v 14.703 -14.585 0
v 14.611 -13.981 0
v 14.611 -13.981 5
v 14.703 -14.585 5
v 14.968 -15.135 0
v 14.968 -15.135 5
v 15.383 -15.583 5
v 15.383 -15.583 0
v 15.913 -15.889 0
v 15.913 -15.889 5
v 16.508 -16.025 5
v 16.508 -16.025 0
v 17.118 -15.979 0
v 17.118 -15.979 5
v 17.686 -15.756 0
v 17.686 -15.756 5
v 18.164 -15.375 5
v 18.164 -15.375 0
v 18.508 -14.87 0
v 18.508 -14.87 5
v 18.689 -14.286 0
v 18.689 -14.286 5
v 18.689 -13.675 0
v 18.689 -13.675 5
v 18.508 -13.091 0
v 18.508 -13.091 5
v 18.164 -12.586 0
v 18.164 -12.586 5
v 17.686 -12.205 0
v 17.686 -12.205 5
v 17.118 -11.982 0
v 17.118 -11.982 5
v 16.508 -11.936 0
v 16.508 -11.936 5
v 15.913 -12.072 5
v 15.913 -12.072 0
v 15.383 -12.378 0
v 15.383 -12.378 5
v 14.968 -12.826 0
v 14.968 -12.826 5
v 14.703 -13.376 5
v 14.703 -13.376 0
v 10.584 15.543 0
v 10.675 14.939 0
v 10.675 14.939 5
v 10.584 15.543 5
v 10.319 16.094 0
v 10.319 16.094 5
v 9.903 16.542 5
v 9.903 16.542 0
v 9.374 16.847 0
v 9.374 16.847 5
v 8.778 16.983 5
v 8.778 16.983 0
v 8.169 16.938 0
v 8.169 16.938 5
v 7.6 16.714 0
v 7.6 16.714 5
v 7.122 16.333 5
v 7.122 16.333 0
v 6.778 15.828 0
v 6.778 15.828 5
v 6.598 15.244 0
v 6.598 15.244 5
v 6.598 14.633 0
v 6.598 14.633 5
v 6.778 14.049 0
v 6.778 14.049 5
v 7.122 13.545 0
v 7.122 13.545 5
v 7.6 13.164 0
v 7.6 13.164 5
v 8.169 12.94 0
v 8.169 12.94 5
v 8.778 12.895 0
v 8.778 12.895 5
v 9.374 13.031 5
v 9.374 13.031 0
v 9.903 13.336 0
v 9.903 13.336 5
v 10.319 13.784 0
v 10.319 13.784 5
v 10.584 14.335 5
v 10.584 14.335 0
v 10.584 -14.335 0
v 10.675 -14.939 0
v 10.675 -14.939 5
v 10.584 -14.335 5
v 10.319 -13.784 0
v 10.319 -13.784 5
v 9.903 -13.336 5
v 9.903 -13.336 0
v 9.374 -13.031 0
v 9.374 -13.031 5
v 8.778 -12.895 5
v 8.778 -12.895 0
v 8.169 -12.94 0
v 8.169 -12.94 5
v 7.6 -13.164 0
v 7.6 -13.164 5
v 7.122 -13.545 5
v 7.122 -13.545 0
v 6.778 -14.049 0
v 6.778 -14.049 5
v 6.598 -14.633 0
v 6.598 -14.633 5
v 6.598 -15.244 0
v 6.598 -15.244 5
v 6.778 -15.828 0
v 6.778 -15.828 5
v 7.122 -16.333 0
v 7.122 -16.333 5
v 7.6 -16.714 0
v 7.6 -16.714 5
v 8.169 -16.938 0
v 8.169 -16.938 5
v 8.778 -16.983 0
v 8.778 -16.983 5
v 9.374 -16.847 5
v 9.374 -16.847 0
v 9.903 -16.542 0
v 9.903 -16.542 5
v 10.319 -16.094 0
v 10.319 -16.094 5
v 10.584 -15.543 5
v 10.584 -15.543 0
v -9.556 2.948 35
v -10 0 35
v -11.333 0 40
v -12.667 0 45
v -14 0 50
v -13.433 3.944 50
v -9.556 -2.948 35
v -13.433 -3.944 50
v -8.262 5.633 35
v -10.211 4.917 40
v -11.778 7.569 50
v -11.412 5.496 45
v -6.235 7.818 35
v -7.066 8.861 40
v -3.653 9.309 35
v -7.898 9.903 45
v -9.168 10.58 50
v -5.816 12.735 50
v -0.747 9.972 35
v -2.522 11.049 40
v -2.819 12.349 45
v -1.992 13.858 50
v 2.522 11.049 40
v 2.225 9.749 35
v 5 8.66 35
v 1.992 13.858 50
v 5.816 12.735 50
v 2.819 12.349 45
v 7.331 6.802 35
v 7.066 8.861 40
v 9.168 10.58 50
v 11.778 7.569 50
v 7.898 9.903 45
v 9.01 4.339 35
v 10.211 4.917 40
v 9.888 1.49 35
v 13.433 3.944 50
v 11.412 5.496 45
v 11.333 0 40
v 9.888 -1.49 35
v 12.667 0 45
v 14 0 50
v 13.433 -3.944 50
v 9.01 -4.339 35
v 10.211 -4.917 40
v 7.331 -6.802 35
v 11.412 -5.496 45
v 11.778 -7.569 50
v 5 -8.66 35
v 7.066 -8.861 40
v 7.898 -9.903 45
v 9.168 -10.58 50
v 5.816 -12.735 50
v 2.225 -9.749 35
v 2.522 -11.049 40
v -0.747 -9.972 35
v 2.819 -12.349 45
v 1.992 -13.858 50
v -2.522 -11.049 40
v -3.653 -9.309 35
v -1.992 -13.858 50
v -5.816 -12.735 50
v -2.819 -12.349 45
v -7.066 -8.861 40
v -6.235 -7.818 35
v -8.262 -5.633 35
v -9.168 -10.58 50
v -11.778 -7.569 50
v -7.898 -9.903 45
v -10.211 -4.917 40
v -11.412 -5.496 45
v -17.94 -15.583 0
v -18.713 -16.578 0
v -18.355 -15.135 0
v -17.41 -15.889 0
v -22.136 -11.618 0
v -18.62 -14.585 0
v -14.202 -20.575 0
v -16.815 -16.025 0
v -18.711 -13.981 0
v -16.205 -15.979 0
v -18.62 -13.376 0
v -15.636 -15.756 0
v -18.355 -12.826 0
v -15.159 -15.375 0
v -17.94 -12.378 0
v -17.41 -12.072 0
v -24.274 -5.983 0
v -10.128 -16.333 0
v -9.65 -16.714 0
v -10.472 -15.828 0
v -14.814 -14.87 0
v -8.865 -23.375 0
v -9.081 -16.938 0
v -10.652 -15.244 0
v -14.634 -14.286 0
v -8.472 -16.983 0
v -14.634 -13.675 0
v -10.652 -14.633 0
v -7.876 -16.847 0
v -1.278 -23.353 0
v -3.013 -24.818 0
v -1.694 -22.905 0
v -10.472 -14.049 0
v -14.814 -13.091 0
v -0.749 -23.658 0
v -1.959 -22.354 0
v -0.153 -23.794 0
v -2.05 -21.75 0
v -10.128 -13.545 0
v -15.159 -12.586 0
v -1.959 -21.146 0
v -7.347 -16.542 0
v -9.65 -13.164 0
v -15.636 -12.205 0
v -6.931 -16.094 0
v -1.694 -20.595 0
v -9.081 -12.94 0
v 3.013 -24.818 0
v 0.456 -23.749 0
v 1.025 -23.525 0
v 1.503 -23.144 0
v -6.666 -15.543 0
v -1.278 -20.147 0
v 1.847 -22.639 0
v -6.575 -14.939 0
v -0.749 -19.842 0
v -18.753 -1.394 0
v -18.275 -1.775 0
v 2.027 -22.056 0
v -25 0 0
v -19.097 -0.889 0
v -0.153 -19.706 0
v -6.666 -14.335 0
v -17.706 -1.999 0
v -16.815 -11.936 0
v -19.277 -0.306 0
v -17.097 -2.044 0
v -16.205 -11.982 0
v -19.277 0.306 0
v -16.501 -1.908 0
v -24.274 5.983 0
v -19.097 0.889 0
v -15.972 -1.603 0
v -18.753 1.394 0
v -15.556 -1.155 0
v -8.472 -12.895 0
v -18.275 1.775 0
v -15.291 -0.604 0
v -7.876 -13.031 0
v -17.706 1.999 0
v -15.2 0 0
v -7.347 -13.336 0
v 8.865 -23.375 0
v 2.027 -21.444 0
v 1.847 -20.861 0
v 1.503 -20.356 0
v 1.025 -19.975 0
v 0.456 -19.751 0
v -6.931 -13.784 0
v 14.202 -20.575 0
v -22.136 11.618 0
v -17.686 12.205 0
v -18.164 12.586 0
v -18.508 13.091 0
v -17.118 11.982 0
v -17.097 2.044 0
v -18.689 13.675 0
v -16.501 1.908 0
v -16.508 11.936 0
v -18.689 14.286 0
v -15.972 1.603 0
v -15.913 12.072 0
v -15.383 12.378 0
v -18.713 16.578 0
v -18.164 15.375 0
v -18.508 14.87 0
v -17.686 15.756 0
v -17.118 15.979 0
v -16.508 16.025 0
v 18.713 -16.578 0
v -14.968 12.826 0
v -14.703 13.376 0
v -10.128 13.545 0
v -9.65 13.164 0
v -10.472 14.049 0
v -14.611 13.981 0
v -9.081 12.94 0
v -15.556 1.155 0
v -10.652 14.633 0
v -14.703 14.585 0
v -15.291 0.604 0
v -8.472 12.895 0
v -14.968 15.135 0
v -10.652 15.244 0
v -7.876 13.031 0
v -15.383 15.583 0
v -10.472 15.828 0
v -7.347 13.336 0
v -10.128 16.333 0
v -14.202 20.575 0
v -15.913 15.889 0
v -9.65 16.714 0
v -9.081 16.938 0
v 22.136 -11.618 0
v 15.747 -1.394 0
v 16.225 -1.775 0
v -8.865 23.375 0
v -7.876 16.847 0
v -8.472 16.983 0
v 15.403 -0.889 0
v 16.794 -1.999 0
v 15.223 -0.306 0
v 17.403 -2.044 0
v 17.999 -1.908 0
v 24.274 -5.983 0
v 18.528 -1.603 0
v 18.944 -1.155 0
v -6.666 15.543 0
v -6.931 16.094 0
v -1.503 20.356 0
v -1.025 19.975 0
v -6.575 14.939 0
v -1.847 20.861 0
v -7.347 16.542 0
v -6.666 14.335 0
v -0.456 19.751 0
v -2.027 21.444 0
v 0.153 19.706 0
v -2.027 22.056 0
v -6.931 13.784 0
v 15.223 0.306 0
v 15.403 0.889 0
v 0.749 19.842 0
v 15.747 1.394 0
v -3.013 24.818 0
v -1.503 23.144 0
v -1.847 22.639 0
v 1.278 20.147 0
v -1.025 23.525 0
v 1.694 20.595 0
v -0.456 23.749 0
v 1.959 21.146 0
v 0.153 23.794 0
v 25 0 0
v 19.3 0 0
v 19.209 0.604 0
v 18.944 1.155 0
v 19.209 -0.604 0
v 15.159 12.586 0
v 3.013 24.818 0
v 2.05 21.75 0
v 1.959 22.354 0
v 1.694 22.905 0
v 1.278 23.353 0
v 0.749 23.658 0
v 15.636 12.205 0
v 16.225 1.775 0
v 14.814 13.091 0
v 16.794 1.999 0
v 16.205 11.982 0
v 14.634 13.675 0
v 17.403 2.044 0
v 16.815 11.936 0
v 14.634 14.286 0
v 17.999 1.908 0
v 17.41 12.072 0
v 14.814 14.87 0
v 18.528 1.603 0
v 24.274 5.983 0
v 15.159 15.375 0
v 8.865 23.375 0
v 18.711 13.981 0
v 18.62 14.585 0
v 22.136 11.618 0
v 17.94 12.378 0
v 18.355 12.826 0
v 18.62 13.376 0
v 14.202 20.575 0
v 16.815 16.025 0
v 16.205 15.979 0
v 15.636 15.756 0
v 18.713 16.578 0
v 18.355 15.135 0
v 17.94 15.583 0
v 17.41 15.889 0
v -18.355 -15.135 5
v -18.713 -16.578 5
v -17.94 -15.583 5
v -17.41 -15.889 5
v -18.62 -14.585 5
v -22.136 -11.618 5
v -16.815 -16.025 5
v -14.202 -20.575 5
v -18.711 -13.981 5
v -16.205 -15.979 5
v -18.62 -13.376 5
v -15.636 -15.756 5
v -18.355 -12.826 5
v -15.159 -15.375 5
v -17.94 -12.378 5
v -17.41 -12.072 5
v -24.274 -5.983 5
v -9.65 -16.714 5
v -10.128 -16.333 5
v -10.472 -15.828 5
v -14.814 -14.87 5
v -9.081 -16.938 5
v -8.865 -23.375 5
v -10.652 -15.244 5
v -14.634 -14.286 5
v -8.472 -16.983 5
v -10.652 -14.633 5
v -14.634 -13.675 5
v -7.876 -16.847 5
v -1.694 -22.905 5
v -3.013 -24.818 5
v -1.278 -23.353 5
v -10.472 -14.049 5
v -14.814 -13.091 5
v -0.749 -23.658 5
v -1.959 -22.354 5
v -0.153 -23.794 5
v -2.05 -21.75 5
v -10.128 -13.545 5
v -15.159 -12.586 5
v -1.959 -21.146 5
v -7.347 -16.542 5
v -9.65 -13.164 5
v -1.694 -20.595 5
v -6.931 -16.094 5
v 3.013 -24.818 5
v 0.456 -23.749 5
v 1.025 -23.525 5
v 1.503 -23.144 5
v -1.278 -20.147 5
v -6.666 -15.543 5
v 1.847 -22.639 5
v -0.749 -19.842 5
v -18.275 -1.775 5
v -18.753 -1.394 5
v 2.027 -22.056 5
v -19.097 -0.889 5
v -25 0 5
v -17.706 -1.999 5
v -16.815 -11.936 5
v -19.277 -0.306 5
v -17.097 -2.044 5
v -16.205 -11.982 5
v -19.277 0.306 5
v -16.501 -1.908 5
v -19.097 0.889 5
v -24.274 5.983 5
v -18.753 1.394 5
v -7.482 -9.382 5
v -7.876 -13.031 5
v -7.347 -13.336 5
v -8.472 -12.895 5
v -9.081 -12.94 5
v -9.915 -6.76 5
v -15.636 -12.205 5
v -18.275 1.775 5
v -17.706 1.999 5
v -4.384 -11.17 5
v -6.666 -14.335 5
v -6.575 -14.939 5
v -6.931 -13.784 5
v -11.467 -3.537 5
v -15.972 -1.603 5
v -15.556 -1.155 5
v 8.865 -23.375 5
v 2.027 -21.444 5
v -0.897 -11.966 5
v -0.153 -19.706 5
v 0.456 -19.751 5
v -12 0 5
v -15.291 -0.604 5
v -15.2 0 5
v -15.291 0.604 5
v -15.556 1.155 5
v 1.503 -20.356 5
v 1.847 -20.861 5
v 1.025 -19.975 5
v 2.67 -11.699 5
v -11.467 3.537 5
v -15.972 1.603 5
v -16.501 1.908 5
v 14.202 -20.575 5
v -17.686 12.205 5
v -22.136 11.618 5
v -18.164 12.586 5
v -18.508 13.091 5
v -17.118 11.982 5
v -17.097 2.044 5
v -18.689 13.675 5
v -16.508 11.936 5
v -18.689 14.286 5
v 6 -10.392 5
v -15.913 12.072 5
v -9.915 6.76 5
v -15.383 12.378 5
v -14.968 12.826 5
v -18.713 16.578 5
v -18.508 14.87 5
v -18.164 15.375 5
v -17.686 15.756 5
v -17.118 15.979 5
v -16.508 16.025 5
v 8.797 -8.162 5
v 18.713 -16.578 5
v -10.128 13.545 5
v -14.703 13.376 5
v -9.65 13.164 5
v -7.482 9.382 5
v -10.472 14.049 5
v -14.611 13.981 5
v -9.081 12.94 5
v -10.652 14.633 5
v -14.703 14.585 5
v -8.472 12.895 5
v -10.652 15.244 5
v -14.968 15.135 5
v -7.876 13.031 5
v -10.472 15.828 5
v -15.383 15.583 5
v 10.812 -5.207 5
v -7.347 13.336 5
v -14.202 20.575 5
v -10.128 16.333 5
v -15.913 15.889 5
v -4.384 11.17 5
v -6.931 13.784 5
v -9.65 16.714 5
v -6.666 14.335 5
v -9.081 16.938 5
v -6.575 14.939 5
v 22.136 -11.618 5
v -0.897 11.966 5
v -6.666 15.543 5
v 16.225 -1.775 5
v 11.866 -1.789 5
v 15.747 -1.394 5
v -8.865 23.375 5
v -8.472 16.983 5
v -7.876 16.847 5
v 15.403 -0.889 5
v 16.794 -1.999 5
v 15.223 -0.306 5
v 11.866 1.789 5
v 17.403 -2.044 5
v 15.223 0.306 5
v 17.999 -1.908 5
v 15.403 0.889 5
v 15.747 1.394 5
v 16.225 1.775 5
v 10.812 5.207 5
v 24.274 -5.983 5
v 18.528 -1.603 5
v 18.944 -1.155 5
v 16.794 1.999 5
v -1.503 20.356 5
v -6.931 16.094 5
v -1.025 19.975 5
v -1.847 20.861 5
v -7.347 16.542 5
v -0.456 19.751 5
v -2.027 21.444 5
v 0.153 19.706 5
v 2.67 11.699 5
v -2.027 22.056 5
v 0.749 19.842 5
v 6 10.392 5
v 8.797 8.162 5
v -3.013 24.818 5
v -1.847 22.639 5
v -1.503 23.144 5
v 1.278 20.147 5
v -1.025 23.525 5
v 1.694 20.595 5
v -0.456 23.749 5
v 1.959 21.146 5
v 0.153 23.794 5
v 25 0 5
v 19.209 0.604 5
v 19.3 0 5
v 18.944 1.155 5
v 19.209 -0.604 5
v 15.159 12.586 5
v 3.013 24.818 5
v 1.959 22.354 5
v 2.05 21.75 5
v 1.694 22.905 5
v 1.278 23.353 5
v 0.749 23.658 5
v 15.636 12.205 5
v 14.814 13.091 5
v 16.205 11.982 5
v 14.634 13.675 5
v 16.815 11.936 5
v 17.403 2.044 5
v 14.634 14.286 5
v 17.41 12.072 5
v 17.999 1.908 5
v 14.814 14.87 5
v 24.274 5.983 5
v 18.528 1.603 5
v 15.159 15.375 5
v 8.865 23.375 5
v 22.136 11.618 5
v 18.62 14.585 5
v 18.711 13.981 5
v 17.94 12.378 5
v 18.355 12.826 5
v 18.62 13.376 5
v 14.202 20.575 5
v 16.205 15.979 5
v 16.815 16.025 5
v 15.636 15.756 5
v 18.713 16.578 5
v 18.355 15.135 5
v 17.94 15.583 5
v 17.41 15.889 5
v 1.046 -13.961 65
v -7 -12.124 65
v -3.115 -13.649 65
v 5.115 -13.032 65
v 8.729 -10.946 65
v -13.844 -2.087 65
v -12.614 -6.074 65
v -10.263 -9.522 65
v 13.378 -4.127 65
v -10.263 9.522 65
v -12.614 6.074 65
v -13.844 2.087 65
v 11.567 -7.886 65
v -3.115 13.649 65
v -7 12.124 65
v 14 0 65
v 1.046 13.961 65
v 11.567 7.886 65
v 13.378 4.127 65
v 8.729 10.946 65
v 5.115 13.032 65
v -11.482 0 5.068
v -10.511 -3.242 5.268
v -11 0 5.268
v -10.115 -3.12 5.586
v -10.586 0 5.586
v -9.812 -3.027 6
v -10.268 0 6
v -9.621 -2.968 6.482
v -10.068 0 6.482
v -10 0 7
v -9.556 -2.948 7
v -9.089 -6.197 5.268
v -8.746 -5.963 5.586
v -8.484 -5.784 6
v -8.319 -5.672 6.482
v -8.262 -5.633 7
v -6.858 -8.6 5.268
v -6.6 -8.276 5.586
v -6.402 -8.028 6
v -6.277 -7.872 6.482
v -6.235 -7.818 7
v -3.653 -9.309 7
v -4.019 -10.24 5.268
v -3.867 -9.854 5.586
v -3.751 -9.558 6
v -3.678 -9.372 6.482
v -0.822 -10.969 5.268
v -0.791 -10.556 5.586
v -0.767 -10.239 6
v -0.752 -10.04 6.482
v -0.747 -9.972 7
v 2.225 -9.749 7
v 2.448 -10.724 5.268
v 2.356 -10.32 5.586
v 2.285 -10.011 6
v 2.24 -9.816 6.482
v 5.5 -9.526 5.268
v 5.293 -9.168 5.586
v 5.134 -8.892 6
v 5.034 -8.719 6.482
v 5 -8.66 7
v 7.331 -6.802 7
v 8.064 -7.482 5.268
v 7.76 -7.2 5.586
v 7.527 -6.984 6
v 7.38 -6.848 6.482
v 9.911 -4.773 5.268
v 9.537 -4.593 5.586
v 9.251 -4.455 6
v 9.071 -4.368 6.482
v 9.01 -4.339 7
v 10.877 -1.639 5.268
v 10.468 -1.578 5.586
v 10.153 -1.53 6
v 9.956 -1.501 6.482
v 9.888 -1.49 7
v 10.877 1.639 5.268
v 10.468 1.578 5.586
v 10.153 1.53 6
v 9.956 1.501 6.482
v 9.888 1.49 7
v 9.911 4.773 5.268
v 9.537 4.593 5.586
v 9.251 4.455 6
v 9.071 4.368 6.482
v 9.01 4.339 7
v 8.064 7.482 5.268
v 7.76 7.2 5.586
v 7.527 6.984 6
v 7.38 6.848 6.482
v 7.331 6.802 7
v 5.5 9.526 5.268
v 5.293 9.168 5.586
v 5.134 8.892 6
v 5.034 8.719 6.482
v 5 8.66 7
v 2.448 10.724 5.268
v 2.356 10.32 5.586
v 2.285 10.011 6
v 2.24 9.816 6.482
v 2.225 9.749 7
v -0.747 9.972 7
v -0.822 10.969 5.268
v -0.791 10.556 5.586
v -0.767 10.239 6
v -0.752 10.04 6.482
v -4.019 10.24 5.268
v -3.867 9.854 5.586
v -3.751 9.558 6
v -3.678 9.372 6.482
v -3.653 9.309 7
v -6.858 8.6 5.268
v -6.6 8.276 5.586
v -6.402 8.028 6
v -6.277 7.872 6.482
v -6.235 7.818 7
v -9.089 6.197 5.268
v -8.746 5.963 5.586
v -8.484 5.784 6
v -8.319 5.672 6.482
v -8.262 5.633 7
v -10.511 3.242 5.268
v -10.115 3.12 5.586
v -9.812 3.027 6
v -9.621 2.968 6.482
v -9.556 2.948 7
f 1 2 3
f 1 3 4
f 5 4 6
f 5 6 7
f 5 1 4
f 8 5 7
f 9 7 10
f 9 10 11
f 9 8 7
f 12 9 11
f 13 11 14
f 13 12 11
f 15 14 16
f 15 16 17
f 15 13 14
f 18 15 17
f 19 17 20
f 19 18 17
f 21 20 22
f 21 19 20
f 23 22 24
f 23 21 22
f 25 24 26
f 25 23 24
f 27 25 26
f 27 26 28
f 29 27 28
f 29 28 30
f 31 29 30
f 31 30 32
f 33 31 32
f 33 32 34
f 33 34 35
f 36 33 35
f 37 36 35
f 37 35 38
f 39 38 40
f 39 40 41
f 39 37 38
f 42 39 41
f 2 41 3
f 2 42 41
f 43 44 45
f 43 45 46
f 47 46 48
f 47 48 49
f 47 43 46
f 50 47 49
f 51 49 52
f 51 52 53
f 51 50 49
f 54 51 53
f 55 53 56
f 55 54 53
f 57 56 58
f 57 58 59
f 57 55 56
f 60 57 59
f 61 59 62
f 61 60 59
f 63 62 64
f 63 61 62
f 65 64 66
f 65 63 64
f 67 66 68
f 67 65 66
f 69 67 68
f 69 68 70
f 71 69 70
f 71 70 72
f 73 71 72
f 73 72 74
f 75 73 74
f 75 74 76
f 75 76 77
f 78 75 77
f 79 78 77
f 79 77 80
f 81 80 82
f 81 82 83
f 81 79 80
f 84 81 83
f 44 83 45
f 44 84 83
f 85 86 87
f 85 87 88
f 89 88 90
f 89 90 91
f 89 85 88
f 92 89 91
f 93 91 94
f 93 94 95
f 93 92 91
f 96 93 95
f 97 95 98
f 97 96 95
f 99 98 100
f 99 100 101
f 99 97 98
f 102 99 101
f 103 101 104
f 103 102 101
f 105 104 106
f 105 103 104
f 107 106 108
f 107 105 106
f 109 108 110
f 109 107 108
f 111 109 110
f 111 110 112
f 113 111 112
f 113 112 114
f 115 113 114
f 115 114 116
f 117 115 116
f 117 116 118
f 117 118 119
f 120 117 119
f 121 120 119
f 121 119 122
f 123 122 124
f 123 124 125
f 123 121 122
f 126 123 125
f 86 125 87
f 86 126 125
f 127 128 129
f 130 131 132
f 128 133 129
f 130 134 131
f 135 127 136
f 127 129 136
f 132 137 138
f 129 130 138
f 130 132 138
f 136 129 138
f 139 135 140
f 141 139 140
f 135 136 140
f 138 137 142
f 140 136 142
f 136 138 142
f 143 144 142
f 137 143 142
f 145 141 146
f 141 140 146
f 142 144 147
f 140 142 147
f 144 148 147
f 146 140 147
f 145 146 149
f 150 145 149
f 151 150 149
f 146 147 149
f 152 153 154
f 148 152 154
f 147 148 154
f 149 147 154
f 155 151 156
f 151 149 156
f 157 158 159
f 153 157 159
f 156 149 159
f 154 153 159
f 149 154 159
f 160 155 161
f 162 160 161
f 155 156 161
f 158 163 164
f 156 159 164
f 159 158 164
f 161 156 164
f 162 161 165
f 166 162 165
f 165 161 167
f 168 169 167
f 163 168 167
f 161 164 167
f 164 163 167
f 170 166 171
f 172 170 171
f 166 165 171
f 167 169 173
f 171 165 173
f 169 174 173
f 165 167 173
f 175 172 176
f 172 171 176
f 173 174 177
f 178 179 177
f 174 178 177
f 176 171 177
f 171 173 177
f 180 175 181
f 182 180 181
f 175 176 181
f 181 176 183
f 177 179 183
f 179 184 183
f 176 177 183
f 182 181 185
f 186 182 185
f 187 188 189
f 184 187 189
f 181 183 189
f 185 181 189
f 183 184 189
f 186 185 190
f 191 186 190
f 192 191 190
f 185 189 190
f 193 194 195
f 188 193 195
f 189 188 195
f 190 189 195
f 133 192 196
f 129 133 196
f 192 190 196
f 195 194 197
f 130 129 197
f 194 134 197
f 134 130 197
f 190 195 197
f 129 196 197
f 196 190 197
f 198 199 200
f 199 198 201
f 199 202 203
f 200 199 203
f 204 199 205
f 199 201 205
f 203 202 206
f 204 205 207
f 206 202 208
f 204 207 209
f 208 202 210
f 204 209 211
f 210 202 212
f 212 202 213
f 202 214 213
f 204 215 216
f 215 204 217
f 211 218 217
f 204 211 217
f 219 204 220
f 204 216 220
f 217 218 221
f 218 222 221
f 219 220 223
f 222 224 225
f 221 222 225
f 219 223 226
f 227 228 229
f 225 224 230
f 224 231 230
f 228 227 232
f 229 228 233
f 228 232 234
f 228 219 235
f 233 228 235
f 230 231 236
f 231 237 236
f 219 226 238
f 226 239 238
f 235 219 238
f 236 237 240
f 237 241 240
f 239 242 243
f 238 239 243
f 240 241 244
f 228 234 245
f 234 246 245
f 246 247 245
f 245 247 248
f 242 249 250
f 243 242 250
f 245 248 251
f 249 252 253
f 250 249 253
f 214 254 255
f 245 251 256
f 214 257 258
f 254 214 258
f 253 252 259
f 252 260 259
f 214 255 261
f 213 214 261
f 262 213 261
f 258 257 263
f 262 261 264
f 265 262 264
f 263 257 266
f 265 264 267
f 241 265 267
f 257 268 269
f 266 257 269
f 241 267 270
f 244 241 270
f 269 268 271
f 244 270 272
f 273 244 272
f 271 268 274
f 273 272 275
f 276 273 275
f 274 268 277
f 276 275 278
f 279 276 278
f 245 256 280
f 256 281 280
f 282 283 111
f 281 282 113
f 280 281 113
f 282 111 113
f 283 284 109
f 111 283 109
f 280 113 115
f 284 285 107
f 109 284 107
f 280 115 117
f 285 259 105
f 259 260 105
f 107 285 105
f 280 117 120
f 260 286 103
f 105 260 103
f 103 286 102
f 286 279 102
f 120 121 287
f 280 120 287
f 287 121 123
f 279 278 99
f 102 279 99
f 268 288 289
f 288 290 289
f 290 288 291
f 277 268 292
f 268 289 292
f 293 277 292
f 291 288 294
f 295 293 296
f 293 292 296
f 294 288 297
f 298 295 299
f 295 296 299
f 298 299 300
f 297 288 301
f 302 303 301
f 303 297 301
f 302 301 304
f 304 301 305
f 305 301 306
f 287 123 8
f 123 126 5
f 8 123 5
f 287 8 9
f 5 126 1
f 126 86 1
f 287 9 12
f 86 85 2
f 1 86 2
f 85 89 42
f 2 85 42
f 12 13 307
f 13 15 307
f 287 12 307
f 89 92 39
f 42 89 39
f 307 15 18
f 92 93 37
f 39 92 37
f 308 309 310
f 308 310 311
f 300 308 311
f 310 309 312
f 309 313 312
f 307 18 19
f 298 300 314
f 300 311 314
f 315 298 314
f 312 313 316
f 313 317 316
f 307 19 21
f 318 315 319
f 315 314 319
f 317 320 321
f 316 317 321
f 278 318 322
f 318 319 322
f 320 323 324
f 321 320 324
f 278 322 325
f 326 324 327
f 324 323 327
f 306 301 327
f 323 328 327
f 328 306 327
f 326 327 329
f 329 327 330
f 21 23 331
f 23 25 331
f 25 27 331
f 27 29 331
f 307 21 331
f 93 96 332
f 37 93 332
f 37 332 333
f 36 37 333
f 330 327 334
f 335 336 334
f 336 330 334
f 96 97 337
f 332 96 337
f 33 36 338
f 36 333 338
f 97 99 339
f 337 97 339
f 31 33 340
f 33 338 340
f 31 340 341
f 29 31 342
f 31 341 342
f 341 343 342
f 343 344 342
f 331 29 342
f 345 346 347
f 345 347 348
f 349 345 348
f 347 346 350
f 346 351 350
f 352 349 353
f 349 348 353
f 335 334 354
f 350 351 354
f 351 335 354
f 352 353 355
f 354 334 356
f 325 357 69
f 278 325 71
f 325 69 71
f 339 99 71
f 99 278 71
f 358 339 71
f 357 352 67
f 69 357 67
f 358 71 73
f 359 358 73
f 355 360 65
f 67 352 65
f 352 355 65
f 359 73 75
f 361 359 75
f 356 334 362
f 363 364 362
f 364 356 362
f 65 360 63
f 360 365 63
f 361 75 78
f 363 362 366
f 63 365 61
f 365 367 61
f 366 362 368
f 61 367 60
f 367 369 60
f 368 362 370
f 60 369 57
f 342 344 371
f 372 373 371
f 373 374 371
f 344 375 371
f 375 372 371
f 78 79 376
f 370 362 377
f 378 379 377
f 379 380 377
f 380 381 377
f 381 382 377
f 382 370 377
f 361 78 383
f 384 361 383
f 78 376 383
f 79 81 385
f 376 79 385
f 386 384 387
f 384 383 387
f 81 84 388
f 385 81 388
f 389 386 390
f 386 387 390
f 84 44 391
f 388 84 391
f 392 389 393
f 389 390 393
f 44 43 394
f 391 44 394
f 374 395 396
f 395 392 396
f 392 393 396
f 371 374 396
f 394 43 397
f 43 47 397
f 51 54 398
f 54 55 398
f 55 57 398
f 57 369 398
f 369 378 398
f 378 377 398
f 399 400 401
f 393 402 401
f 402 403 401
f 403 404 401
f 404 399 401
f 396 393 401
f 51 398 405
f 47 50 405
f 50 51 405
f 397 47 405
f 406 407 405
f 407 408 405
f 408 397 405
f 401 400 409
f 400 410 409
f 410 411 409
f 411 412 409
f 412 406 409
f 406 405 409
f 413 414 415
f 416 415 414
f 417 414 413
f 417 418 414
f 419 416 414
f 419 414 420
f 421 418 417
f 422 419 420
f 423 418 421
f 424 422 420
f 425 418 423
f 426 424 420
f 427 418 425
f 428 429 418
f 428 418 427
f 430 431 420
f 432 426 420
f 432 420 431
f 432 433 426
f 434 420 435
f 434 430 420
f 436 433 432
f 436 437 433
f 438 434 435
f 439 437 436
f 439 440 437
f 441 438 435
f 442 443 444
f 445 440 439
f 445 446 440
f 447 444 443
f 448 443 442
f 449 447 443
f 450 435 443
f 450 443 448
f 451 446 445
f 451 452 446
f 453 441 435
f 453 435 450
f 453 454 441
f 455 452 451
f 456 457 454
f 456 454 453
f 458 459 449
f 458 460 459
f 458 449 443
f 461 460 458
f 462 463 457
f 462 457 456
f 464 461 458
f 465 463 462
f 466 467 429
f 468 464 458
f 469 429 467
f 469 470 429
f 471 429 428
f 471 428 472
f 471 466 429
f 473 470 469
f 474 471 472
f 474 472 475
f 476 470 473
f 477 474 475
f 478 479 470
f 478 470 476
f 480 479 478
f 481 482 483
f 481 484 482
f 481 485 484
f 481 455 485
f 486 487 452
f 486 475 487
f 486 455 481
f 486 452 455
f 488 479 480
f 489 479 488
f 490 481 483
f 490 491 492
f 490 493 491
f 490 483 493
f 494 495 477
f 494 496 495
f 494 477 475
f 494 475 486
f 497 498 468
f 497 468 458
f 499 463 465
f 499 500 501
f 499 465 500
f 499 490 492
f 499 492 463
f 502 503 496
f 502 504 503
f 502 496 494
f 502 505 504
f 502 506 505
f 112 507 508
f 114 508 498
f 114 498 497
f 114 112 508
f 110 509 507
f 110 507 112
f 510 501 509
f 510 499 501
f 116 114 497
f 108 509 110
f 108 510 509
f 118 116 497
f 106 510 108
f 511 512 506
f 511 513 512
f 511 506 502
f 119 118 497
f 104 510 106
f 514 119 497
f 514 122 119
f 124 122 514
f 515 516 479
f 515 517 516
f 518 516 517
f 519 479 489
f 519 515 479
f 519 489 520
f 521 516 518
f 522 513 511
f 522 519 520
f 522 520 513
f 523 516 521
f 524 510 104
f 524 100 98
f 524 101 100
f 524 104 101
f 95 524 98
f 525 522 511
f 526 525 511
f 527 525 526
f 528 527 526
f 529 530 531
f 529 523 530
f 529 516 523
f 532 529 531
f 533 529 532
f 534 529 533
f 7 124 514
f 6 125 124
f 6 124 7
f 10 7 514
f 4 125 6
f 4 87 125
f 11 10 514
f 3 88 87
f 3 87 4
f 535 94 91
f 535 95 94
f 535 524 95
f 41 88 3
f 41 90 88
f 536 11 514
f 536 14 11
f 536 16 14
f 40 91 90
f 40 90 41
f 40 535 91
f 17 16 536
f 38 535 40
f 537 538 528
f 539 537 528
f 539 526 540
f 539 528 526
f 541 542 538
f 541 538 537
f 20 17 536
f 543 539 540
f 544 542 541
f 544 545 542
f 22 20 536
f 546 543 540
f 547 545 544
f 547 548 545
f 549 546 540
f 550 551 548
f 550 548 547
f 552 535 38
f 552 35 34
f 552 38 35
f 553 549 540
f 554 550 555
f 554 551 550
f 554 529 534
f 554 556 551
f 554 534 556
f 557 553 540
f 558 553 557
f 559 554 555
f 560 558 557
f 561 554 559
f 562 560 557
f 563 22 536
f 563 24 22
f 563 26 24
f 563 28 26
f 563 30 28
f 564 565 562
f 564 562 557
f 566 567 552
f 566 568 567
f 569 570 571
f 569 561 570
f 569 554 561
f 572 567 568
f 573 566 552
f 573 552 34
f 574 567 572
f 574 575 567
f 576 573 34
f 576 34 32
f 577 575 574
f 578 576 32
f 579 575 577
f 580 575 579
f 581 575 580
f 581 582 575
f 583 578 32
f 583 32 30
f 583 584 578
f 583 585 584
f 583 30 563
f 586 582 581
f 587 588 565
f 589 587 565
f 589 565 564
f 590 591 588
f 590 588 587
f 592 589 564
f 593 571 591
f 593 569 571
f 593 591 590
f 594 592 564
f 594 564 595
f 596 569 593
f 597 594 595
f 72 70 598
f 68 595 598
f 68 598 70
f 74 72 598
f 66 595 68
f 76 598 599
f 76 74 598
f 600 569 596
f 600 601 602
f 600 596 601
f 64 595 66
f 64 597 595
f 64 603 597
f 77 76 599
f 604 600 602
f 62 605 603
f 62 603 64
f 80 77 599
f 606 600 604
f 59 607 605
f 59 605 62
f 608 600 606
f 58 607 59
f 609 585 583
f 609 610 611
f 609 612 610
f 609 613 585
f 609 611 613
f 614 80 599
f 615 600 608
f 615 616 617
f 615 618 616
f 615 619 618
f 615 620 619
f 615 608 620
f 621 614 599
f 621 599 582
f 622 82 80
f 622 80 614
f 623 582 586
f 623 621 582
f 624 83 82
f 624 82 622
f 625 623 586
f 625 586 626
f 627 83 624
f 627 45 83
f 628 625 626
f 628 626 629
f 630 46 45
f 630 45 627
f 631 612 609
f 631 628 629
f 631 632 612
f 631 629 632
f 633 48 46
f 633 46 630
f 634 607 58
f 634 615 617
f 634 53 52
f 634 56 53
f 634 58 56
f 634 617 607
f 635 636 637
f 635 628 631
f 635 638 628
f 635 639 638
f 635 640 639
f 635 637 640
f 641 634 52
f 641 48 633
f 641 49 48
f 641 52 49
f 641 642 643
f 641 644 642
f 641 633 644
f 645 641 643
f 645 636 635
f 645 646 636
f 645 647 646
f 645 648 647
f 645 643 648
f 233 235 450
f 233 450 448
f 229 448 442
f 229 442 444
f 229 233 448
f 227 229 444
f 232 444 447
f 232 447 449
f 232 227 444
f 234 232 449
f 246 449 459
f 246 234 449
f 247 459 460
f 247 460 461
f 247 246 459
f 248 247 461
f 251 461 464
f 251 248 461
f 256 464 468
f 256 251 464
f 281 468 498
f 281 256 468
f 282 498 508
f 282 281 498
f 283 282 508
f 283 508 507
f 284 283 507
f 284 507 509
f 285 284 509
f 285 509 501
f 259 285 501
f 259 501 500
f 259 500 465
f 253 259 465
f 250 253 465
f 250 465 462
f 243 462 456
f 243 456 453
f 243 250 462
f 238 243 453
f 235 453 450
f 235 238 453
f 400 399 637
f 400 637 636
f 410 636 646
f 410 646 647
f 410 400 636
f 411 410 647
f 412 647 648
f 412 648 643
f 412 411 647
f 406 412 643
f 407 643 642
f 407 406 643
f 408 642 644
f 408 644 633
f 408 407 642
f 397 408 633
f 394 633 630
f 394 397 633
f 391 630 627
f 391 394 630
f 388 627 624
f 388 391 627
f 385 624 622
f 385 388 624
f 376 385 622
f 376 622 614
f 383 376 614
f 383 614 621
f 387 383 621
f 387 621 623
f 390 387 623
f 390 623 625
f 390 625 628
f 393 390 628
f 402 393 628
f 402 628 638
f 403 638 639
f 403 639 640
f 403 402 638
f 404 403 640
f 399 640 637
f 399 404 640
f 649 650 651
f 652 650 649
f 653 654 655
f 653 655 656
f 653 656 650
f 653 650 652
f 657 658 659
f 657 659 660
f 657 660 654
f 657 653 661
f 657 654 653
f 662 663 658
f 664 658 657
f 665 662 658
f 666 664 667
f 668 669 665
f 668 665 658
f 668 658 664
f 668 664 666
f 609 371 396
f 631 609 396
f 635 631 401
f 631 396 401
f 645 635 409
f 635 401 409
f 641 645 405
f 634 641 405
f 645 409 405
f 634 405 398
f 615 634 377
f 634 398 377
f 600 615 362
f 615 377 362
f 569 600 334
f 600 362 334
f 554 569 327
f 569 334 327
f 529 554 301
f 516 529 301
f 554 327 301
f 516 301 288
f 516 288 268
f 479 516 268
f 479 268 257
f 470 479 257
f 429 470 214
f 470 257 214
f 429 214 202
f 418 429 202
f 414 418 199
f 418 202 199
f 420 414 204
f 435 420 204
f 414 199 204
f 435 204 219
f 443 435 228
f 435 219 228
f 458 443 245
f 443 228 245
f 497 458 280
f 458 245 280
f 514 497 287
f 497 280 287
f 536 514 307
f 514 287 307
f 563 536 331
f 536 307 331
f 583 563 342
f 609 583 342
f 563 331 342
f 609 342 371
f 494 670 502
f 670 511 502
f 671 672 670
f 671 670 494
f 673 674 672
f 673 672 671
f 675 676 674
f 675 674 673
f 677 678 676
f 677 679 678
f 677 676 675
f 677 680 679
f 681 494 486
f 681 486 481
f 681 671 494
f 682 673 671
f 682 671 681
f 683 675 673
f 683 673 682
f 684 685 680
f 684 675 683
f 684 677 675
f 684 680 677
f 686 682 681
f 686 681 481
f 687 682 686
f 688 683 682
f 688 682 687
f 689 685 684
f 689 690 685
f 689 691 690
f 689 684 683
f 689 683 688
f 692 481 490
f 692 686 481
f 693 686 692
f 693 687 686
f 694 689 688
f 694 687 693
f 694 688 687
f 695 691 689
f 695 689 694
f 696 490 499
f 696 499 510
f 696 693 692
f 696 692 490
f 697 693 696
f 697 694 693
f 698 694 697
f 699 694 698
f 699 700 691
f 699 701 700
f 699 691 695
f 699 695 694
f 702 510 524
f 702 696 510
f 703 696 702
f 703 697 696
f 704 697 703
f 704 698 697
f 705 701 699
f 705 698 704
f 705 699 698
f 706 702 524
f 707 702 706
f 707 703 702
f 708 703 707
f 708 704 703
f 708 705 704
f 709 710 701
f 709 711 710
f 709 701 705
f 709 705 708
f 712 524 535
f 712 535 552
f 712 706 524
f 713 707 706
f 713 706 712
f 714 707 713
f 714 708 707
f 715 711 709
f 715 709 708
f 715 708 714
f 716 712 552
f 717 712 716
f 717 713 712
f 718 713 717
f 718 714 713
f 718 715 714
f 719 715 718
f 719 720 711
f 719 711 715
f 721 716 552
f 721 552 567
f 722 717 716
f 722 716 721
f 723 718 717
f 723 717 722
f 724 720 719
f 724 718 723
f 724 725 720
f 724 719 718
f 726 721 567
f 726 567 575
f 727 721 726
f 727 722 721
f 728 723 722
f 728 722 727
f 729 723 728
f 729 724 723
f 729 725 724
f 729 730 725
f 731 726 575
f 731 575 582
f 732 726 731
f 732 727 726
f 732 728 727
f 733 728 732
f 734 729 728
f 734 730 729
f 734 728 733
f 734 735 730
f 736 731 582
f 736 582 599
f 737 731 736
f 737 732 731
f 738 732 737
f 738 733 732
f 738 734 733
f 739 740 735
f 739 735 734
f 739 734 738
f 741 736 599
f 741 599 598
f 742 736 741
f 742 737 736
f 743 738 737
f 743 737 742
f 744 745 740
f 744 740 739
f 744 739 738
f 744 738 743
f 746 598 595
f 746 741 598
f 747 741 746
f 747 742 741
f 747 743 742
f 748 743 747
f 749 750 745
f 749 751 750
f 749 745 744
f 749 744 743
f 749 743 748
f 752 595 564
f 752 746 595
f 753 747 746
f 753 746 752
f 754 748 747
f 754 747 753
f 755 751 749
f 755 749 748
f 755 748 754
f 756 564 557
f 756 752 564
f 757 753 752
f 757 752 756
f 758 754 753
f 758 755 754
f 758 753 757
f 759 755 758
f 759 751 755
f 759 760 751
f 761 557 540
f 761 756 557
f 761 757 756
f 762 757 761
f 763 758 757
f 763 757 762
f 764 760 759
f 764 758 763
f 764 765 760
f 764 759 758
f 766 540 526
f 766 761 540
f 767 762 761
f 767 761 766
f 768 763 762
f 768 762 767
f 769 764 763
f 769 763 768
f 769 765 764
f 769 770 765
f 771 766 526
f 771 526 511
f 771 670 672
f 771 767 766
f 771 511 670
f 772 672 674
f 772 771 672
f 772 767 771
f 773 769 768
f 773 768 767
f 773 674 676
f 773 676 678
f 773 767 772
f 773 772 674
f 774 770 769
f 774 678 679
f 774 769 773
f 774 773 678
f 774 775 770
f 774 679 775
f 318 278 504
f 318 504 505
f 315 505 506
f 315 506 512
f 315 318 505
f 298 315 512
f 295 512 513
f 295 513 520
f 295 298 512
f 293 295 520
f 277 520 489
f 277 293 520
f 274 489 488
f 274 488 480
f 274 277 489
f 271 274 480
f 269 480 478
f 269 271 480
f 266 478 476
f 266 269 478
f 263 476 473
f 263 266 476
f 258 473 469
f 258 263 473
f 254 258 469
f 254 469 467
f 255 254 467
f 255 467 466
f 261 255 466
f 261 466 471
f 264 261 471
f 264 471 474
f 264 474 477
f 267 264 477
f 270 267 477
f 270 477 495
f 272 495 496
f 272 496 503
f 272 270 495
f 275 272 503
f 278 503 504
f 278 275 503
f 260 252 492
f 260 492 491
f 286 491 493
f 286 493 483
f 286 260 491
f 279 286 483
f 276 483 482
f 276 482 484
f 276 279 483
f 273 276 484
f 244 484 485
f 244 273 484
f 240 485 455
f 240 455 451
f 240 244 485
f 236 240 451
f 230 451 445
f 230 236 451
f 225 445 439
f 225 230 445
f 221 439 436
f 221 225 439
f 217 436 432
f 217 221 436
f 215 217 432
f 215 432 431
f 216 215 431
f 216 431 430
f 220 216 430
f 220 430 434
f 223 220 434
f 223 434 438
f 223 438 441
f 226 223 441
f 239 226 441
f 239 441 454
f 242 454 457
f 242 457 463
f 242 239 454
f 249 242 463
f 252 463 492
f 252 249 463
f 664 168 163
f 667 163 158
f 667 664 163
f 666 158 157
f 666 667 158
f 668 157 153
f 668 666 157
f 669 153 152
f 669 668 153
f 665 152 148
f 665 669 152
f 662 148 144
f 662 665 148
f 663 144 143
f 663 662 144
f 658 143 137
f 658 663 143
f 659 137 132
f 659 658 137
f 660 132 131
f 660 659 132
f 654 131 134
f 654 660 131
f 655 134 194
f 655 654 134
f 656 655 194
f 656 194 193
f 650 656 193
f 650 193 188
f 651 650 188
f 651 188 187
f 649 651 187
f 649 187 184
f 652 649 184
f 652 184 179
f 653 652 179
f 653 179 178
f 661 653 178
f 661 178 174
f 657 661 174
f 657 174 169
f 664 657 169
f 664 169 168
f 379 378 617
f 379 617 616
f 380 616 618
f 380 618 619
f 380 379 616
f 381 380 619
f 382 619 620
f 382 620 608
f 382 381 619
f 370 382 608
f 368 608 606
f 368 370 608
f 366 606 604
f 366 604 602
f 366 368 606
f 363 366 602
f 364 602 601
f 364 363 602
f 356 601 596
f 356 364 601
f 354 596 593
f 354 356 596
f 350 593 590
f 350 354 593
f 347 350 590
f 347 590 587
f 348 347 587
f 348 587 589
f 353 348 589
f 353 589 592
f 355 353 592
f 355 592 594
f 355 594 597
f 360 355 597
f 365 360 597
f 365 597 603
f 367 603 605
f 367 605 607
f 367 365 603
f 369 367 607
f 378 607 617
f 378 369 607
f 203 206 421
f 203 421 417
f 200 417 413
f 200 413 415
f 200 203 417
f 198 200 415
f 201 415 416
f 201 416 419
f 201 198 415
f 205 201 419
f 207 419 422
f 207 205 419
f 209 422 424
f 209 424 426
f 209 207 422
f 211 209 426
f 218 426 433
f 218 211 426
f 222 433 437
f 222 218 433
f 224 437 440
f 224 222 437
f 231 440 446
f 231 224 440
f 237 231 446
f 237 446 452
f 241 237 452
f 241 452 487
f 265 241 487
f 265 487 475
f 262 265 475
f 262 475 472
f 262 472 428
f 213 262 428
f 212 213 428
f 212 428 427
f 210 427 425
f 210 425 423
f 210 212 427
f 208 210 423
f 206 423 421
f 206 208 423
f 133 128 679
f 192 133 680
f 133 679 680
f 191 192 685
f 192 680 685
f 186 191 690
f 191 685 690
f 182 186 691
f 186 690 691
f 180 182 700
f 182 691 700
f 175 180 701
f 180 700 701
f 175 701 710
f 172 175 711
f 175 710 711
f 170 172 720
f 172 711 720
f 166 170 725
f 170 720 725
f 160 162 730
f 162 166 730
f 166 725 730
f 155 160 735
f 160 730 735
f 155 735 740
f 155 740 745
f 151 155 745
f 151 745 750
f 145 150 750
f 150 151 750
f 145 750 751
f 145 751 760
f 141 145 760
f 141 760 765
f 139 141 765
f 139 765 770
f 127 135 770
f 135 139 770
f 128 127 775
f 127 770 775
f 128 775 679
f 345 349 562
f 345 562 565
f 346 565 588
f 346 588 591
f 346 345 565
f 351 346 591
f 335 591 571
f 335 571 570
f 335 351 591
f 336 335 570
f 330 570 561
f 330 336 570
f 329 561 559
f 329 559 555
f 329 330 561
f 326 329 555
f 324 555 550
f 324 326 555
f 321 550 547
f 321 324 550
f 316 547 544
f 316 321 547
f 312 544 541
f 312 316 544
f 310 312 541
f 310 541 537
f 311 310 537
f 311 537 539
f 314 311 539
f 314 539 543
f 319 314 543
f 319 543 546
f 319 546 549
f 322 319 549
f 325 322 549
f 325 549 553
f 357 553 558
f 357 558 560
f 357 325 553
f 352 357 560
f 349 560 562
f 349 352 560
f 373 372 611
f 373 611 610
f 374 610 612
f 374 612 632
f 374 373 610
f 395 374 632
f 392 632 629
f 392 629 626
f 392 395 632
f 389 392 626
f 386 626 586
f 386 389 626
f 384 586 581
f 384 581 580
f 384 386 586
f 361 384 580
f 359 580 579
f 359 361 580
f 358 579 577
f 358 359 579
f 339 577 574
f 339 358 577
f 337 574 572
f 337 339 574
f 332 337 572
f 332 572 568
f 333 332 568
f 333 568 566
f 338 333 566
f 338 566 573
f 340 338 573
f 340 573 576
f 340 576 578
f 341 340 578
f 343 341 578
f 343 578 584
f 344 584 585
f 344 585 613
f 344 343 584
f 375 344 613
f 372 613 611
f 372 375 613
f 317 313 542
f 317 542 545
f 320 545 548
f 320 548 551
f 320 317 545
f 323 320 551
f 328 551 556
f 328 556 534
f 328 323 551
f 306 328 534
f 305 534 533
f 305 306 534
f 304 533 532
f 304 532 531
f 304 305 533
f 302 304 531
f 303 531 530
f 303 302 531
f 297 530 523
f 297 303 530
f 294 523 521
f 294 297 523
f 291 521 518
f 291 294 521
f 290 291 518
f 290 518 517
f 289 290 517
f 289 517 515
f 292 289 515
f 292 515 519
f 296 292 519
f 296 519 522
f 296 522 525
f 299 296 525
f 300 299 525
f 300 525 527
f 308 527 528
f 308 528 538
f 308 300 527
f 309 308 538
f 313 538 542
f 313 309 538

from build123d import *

# Parameters (mm, degrees)
SKETCH_1_R       = 25
SKETCH_1_R_2     = 2.05
EXTRUDE_1_DEPTH  = 5
SKETCH_2_R       = 10
EXTRUDE_2_DEPTH  = 60
FILLET_1_R       = 2
SKETCH_4_R       = 14
EXTRUDE_3_DEPTH  = 15
CHAMFER_1_SIZE   = 15
CHAMFER_1_SIZE_2 = 4


with BuildPart() as part:
    # 草图1 → 凸台-拉伸1 (new body)
    with BuildSketch(Plane.XY):
        Circle(SKETCH_1_R)
        with Locations((0, 21.75)):
            Circle(SKETCH_1_R_2, mode=Mode.SUBTRACT)
        with Locations((16.661466638, 13.980630511)):
            Circle(SKETCH_1_R_2, mode=Mode.SUBTRACT)
        with Locations((-16.661466638, 13.980630511)):
            Circle(SKETCH_1_R_2, mode=Mode.SUBTRACT)
        with Locations(Location((16.661466638, -13.980630511, 0), (0, 0, 180))):
            Circle(SKETCH_1_R_2, mode=Mode.SUBTRACT)
        with Locations(Location((0, -21.75, 0), (0, 0, 180))):
            Circle(SKETCH_1_R_2, mode=Mode.SUBTRACT)
        with Locations(Location((-16.661466638, -13.980630511, 0), (0, 0, 180))):
            Circle(SKETCH_1_R_2, mode=Mode.SUBTRACT)
        with Locations((8.625, 14.938938215)):
            Circle(SKETCH_1_R_2, mode=Mode.SUBTRACT)
        with Locations((17.25, 0)):
            Circle(SKETCH_1_R_2, mode=Mode.SUBTRACT)
        with Locations((8.625, -14.938938215)):
            Circle(SKETCH_1_R_2, mode=Mode.SUBTRACT)
        with Locations((-8.625, -14.938938215)):
            Circle(SKETCH_1_R_2, mode=Mode.SUBTRACT)
        with Locations((-17.25, 0)):
            Circle(SKETCH_1_R_2, mode=Mode.SUBTRACT)
        with Locations((-8.625, 14.938938215)):
            Circle(SKETCH_1_R_2, mode=Mode.SUBTRACT)
    extrude(amount=EXTRUDE_1_DEPTH)

    # 草图2 → 凸台-拉伸2 (add)
    with BuildSketch(Plane.XY.offset(5)):
        with Locations(Location((0, 0, 0), (0, 0, 180))):
            Circle(SKETCH_2_R)
    extrude(amount=EXTRUDE_2_DEPTH)

    # 圆角1
    fillet_1_edges = [part.edges().sort_by_distance(p)[0] for p in [
        (10, 0, 5),
    ]]
    fillet(fillet_1_edges, radius=FILLET_1_R)

    # 草图4 → 凸台-拉伸3 (add)
    with BuildSketch(Plane.XY.offset(65)):
        Circle(SKETCH_4_R)
    extrude(amount=-EXTRUDE_3_DEPTH)

    # 倒角1
    # the kernel refuses this chamfer: 15, 4 mm, written as the material it adds along each edge
    with BuildSketch(Plane(origin=(0, 0, 50), x_dir=(-1, 0, 0), z_dir=(0, -1, 0))) as chamfer_1_piece_1_section:
        Polygon((10, CHAMFER_1_SIZE), (10 + CHAMFER_1_SIZE_2, 0), (10, 0), align=None)
    chamfer_1_piece_1 = revolve(axis=Axis((0, 0, 50), (0, 0, -1)), mode=Mode.PRIVATE)
    chamfer_1_piece_1 = chamfer_1_piece_1 & Plane(origin=(0, 0, 42.245414998), x_dir=(1, 0, 0), z_dir=(0, 0, 1)) * Cylinder(14, 60, mode=Mode.PRIVATE)
    add(chamfer_1_piece_1)


solid = part.part
